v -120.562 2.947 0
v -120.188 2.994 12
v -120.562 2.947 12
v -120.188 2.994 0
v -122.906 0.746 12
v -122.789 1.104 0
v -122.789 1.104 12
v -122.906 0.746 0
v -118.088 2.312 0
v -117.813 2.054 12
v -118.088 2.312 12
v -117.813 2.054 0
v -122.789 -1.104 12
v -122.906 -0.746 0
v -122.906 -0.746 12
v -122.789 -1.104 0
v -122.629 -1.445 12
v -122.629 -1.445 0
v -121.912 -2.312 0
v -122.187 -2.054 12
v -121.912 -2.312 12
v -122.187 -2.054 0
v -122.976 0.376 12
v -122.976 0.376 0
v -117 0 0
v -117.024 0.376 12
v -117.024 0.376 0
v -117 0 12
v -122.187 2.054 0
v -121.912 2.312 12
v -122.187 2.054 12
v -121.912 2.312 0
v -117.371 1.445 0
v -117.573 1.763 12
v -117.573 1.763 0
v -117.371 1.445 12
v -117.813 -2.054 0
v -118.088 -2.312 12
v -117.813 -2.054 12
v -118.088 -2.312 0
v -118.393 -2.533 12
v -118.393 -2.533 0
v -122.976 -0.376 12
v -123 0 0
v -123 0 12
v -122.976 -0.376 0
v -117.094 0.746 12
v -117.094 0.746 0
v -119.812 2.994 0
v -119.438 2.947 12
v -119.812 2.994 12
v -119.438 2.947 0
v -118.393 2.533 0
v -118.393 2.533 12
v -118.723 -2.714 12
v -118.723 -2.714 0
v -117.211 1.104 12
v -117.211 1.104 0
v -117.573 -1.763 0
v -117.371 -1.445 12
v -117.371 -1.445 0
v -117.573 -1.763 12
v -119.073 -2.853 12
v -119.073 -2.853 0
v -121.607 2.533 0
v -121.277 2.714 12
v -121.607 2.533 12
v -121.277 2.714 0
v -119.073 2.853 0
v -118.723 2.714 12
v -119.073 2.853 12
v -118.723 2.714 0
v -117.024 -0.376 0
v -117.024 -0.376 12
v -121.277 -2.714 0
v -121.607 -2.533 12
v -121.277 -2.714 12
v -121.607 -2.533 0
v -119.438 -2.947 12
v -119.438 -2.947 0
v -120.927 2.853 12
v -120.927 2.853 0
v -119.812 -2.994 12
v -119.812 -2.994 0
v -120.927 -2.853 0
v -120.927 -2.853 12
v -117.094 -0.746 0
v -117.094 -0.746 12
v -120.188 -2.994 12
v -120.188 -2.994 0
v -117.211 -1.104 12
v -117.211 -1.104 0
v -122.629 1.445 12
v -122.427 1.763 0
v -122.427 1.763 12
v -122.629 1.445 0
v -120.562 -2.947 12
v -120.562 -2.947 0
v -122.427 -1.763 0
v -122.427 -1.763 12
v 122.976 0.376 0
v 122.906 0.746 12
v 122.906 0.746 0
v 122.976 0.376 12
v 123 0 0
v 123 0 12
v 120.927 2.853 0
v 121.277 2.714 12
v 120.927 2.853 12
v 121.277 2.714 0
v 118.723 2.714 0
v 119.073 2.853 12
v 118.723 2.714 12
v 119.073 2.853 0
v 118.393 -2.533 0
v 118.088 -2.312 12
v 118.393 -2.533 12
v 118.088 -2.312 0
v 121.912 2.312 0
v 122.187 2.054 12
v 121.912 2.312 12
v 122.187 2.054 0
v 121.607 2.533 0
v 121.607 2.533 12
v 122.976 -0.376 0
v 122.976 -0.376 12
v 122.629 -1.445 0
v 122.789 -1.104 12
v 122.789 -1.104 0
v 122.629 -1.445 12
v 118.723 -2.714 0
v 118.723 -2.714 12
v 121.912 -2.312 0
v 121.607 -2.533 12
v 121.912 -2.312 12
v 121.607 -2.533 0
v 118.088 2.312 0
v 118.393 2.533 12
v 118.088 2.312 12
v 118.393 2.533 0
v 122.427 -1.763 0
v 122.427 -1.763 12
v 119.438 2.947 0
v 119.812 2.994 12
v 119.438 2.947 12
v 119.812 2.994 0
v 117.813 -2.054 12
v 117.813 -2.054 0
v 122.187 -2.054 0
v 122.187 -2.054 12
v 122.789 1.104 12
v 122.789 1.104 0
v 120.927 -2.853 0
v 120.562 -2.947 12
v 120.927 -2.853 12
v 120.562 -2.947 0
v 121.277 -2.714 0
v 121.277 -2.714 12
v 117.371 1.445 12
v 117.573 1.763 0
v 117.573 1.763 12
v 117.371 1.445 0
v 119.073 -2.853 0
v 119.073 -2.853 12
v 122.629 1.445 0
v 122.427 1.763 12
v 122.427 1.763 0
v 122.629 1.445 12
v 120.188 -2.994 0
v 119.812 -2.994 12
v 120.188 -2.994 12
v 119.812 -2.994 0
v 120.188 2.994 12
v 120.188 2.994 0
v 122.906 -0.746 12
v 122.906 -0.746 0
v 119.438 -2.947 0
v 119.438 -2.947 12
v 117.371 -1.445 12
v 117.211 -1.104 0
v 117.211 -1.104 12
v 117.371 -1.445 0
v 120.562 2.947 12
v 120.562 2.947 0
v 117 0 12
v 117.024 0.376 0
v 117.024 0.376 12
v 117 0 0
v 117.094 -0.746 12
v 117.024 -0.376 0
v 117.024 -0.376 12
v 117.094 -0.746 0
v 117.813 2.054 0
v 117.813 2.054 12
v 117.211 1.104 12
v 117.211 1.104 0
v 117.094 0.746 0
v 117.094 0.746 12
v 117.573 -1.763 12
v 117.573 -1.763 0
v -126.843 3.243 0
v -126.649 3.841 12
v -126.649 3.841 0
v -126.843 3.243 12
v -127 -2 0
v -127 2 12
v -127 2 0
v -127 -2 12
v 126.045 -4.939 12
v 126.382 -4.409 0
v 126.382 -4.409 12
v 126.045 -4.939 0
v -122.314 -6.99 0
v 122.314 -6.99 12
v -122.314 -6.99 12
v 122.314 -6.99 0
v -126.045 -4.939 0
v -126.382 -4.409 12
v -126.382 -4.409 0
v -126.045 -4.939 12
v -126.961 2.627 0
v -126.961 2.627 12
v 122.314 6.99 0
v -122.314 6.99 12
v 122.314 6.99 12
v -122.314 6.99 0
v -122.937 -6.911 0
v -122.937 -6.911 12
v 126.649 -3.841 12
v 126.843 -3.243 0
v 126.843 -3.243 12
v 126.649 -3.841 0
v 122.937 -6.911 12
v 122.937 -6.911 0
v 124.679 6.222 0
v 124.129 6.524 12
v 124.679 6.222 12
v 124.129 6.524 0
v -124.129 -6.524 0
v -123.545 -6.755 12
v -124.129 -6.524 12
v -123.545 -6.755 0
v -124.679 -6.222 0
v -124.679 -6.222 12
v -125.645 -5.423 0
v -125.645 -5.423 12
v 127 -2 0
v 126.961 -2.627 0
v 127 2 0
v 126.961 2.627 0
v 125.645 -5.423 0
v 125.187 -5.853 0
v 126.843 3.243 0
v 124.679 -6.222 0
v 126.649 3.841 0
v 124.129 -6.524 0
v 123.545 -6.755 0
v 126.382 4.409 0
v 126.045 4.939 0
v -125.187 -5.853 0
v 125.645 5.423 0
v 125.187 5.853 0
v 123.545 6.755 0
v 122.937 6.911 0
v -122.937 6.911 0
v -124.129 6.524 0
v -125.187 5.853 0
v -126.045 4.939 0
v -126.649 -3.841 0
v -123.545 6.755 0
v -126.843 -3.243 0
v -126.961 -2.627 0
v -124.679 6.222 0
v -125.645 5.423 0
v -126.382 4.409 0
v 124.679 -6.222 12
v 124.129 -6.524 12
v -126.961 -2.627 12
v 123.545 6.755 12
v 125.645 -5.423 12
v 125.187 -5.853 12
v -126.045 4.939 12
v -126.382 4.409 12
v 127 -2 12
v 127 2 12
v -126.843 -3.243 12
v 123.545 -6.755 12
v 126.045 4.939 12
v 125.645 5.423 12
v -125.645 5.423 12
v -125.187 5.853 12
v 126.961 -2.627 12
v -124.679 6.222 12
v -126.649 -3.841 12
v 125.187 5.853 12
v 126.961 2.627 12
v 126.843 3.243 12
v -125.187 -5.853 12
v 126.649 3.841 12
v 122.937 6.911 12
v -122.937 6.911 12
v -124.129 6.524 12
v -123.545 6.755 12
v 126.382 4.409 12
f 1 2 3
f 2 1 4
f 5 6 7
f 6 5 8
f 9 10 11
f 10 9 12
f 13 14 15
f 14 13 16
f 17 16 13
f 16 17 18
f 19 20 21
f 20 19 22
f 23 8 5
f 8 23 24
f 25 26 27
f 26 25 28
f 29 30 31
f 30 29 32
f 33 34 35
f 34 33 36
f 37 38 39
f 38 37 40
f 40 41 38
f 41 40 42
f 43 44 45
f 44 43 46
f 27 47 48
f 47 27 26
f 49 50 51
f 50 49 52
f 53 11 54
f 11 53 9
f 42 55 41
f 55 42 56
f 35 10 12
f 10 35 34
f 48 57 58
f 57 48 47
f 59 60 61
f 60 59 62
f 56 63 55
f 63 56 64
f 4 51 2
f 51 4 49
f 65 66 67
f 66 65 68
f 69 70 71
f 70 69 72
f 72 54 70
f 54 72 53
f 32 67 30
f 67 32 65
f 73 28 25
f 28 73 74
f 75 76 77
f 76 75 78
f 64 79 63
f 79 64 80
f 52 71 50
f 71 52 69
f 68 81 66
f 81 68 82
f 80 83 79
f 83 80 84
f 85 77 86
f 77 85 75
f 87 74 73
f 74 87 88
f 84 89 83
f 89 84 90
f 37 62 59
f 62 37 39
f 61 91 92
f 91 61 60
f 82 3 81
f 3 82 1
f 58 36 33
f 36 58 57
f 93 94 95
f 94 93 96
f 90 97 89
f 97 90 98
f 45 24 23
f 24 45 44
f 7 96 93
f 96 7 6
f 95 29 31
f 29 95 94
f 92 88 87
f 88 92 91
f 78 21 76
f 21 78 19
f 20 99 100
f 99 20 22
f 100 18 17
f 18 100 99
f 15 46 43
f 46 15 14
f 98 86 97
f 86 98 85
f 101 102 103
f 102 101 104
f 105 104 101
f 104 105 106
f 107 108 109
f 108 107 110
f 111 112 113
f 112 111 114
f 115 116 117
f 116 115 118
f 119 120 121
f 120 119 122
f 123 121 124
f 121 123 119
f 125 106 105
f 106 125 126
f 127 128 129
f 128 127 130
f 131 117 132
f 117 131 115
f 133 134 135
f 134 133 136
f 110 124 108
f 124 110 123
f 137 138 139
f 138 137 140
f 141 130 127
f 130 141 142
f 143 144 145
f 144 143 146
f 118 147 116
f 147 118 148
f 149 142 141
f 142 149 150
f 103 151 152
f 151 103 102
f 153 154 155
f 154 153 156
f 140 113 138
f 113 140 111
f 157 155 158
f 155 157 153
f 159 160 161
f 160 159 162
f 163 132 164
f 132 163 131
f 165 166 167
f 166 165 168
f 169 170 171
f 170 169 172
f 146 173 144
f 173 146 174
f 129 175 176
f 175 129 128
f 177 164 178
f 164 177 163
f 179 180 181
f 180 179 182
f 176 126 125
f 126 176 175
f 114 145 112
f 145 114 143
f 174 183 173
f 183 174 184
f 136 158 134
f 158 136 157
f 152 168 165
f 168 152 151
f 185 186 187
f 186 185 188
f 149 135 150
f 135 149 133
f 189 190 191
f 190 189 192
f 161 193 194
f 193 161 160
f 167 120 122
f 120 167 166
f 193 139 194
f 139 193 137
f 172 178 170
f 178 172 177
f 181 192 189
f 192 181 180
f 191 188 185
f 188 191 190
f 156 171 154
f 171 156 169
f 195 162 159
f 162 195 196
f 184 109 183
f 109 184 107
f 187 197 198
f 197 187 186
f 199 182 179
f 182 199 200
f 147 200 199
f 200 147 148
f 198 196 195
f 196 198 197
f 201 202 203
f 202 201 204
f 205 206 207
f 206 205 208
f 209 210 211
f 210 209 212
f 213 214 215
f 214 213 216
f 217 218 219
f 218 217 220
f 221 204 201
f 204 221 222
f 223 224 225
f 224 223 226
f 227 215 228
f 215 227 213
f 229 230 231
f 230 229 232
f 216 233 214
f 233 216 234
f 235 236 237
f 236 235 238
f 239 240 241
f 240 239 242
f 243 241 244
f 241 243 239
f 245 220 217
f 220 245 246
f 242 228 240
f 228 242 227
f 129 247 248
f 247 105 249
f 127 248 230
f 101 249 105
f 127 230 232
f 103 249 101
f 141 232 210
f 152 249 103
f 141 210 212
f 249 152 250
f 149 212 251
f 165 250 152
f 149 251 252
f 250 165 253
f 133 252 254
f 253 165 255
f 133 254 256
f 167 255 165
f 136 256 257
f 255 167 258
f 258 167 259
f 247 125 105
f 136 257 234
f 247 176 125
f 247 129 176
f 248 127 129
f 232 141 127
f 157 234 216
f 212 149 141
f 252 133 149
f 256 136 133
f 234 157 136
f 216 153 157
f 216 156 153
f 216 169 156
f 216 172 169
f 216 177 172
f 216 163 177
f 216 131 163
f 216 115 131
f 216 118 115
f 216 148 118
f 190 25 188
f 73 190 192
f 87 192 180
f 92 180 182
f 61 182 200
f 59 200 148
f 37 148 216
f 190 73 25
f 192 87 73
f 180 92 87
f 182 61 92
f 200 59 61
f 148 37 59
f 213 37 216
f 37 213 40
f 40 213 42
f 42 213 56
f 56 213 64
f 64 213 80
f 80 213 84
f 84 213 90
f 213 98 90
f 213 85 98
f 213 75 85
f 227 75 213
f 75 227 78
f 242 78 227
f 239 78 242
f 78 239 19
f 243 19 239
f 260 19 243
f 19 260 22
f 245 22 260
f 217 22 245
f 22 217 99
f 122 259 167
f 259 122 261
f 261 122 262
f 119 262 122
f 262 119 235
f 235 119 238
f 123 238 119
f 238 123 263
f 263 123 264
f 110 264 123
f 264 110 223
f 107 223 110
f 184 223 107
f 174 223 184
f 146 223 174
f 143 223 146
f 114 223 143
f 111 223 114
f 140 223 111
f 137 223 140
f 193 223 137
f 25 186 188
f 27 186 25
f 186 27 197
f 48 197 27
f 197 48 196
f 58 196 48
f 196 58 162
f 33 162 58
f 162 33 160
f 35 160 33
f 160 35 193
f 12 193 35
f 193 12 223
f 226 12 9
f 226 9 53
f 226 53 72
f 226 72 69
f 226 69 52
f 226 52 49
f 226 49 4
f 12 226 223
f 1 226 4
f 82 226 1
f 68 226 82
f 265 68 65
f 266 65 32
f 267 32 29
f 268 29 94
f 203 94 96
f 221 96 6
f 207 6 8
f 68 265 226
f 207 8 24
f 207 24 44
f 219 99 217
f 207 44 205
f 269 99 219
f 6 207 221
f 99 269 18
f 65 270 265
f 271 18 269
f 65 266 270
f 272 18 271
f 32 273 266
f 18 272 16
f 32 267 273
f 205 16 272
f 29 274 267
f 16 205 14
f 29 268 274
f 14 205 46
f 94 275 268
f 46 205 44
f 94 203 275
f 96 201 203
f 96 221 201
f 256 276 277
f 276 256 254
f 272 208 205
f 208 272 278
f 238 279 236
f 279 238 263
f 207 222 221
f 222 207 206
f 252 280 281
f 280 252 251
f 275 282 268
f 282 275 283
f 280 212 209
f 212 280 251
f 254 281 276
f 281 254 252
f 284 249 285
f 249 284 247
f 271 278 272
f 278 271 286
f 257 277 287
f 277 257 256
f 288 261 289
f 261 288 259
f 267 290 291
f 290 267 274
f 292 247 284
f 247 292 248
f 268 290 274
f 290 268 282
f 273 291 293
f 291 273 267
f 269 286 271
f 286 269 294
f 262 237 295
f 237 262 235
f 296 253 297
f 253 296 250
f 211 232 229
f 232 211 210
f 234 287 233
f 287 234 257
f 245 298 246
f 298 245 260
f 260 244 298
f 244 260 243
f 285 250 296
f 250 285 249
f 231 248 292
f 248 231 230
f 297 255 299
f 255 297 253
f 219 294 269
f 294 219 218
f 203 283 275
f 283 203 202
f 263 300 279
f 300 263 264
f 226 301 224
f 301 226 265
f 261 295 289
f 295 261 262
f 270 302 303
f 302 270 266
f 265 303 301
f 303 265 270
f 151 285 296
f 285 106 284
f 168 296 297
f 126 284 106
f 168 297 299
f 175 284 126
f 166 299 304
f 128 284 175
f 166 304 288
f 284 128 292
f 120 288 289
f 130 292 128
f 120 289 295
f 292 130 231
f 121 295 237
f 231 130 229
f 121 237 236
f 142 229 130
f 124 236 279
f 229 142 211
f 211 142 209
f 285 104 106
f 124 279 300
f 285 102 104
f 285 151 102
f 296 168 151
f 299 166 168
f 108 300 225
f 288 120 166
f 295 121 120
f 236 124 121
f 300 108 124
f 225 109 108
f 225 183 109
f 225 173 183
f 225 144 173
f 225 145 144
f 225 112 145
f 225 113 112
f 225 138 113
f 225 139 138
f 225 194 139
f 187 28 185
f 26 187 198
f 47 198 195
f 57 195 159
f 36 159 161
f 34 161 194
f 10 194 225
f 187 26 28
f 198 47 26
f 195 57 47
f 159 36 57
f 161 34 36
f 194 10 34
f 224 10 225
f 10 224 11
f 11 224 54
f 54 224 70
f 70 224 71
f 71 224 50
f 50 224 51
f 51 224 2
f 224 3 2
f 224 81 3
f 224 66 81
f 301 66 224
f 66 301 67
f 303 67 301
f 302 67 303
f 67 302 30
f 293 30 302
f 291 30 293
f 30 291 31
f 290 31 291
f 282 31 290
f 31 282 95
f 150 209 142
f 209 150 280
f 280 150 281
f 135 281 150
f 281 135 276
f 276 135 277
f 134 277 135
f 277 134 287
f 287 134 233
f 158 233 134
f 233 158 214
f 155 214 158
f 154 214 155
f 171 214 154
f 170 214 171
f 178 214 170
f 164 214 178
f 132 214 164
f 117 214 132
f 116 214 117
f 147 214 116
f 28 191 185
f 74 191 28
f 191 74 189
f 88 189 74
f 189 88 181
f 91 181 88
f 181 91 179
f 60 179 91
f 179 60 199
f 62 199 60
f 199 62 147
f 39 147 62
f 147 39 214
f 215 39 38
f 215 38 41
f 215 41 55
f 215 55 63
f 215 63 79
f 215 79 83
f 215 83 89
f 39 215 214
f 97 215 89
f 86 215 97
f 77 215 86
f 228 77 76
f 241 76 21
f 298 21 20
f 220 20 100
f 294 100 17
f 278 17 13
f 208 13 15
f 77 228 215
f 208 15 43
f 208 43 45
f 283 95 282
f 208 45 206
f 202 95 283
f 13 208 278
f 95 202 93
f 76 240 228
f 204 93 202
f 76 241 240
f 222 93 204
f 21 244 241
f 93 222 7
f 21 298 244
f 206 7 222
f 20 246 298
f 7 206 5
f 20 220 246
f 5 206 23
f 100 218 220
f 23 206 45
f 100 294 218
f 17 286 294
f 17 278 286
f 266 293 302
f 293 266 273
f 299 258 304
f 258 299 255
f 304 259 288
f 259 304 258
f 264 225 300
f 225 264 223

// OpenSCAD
$fn = 50;


difference() {
	union() {
		hull() {
			translate(v = [-122.0000000000, 2.0000000000, 0]) {
				cylinder(h = 12, r = 5);
			}
			translate(v = [122.0000000000, 2.0000000000, 0]) {
				cylinder(h = 12, r = 5);
			}
			translate(v = [-122.0000000000, -2.0000000000, 0]) {
				cylinder(h = 12, r = 5);
			}
			translate(v = [122.0000000000, -2.0000000000, 0]) {
				cylinder(h = 12, r = 5);
			}
		}
	}
	union() {
		translate(v = [-120.0000000000, 0.0000000000, -100.0000000000]) {
			cylinder(h = 200, r = 3.0000000000);
		}
		translate(v = [-120.0000000000, 0.0000000000, -100.0000000000]) {
			cylinder(h = 200, r = 3.0000000000);
		}
		translate(v = [120.0000000000, 0.0000000000, -100.0000000000]) {
			cylinder(h = 200, r = 3.0000000000);
		}
		translate(v = [120.0000000000, 0.0000000000, -100.0000000000]) {
			cylinder(h = 200, r = 3.0000000000);
		}
	}
}
